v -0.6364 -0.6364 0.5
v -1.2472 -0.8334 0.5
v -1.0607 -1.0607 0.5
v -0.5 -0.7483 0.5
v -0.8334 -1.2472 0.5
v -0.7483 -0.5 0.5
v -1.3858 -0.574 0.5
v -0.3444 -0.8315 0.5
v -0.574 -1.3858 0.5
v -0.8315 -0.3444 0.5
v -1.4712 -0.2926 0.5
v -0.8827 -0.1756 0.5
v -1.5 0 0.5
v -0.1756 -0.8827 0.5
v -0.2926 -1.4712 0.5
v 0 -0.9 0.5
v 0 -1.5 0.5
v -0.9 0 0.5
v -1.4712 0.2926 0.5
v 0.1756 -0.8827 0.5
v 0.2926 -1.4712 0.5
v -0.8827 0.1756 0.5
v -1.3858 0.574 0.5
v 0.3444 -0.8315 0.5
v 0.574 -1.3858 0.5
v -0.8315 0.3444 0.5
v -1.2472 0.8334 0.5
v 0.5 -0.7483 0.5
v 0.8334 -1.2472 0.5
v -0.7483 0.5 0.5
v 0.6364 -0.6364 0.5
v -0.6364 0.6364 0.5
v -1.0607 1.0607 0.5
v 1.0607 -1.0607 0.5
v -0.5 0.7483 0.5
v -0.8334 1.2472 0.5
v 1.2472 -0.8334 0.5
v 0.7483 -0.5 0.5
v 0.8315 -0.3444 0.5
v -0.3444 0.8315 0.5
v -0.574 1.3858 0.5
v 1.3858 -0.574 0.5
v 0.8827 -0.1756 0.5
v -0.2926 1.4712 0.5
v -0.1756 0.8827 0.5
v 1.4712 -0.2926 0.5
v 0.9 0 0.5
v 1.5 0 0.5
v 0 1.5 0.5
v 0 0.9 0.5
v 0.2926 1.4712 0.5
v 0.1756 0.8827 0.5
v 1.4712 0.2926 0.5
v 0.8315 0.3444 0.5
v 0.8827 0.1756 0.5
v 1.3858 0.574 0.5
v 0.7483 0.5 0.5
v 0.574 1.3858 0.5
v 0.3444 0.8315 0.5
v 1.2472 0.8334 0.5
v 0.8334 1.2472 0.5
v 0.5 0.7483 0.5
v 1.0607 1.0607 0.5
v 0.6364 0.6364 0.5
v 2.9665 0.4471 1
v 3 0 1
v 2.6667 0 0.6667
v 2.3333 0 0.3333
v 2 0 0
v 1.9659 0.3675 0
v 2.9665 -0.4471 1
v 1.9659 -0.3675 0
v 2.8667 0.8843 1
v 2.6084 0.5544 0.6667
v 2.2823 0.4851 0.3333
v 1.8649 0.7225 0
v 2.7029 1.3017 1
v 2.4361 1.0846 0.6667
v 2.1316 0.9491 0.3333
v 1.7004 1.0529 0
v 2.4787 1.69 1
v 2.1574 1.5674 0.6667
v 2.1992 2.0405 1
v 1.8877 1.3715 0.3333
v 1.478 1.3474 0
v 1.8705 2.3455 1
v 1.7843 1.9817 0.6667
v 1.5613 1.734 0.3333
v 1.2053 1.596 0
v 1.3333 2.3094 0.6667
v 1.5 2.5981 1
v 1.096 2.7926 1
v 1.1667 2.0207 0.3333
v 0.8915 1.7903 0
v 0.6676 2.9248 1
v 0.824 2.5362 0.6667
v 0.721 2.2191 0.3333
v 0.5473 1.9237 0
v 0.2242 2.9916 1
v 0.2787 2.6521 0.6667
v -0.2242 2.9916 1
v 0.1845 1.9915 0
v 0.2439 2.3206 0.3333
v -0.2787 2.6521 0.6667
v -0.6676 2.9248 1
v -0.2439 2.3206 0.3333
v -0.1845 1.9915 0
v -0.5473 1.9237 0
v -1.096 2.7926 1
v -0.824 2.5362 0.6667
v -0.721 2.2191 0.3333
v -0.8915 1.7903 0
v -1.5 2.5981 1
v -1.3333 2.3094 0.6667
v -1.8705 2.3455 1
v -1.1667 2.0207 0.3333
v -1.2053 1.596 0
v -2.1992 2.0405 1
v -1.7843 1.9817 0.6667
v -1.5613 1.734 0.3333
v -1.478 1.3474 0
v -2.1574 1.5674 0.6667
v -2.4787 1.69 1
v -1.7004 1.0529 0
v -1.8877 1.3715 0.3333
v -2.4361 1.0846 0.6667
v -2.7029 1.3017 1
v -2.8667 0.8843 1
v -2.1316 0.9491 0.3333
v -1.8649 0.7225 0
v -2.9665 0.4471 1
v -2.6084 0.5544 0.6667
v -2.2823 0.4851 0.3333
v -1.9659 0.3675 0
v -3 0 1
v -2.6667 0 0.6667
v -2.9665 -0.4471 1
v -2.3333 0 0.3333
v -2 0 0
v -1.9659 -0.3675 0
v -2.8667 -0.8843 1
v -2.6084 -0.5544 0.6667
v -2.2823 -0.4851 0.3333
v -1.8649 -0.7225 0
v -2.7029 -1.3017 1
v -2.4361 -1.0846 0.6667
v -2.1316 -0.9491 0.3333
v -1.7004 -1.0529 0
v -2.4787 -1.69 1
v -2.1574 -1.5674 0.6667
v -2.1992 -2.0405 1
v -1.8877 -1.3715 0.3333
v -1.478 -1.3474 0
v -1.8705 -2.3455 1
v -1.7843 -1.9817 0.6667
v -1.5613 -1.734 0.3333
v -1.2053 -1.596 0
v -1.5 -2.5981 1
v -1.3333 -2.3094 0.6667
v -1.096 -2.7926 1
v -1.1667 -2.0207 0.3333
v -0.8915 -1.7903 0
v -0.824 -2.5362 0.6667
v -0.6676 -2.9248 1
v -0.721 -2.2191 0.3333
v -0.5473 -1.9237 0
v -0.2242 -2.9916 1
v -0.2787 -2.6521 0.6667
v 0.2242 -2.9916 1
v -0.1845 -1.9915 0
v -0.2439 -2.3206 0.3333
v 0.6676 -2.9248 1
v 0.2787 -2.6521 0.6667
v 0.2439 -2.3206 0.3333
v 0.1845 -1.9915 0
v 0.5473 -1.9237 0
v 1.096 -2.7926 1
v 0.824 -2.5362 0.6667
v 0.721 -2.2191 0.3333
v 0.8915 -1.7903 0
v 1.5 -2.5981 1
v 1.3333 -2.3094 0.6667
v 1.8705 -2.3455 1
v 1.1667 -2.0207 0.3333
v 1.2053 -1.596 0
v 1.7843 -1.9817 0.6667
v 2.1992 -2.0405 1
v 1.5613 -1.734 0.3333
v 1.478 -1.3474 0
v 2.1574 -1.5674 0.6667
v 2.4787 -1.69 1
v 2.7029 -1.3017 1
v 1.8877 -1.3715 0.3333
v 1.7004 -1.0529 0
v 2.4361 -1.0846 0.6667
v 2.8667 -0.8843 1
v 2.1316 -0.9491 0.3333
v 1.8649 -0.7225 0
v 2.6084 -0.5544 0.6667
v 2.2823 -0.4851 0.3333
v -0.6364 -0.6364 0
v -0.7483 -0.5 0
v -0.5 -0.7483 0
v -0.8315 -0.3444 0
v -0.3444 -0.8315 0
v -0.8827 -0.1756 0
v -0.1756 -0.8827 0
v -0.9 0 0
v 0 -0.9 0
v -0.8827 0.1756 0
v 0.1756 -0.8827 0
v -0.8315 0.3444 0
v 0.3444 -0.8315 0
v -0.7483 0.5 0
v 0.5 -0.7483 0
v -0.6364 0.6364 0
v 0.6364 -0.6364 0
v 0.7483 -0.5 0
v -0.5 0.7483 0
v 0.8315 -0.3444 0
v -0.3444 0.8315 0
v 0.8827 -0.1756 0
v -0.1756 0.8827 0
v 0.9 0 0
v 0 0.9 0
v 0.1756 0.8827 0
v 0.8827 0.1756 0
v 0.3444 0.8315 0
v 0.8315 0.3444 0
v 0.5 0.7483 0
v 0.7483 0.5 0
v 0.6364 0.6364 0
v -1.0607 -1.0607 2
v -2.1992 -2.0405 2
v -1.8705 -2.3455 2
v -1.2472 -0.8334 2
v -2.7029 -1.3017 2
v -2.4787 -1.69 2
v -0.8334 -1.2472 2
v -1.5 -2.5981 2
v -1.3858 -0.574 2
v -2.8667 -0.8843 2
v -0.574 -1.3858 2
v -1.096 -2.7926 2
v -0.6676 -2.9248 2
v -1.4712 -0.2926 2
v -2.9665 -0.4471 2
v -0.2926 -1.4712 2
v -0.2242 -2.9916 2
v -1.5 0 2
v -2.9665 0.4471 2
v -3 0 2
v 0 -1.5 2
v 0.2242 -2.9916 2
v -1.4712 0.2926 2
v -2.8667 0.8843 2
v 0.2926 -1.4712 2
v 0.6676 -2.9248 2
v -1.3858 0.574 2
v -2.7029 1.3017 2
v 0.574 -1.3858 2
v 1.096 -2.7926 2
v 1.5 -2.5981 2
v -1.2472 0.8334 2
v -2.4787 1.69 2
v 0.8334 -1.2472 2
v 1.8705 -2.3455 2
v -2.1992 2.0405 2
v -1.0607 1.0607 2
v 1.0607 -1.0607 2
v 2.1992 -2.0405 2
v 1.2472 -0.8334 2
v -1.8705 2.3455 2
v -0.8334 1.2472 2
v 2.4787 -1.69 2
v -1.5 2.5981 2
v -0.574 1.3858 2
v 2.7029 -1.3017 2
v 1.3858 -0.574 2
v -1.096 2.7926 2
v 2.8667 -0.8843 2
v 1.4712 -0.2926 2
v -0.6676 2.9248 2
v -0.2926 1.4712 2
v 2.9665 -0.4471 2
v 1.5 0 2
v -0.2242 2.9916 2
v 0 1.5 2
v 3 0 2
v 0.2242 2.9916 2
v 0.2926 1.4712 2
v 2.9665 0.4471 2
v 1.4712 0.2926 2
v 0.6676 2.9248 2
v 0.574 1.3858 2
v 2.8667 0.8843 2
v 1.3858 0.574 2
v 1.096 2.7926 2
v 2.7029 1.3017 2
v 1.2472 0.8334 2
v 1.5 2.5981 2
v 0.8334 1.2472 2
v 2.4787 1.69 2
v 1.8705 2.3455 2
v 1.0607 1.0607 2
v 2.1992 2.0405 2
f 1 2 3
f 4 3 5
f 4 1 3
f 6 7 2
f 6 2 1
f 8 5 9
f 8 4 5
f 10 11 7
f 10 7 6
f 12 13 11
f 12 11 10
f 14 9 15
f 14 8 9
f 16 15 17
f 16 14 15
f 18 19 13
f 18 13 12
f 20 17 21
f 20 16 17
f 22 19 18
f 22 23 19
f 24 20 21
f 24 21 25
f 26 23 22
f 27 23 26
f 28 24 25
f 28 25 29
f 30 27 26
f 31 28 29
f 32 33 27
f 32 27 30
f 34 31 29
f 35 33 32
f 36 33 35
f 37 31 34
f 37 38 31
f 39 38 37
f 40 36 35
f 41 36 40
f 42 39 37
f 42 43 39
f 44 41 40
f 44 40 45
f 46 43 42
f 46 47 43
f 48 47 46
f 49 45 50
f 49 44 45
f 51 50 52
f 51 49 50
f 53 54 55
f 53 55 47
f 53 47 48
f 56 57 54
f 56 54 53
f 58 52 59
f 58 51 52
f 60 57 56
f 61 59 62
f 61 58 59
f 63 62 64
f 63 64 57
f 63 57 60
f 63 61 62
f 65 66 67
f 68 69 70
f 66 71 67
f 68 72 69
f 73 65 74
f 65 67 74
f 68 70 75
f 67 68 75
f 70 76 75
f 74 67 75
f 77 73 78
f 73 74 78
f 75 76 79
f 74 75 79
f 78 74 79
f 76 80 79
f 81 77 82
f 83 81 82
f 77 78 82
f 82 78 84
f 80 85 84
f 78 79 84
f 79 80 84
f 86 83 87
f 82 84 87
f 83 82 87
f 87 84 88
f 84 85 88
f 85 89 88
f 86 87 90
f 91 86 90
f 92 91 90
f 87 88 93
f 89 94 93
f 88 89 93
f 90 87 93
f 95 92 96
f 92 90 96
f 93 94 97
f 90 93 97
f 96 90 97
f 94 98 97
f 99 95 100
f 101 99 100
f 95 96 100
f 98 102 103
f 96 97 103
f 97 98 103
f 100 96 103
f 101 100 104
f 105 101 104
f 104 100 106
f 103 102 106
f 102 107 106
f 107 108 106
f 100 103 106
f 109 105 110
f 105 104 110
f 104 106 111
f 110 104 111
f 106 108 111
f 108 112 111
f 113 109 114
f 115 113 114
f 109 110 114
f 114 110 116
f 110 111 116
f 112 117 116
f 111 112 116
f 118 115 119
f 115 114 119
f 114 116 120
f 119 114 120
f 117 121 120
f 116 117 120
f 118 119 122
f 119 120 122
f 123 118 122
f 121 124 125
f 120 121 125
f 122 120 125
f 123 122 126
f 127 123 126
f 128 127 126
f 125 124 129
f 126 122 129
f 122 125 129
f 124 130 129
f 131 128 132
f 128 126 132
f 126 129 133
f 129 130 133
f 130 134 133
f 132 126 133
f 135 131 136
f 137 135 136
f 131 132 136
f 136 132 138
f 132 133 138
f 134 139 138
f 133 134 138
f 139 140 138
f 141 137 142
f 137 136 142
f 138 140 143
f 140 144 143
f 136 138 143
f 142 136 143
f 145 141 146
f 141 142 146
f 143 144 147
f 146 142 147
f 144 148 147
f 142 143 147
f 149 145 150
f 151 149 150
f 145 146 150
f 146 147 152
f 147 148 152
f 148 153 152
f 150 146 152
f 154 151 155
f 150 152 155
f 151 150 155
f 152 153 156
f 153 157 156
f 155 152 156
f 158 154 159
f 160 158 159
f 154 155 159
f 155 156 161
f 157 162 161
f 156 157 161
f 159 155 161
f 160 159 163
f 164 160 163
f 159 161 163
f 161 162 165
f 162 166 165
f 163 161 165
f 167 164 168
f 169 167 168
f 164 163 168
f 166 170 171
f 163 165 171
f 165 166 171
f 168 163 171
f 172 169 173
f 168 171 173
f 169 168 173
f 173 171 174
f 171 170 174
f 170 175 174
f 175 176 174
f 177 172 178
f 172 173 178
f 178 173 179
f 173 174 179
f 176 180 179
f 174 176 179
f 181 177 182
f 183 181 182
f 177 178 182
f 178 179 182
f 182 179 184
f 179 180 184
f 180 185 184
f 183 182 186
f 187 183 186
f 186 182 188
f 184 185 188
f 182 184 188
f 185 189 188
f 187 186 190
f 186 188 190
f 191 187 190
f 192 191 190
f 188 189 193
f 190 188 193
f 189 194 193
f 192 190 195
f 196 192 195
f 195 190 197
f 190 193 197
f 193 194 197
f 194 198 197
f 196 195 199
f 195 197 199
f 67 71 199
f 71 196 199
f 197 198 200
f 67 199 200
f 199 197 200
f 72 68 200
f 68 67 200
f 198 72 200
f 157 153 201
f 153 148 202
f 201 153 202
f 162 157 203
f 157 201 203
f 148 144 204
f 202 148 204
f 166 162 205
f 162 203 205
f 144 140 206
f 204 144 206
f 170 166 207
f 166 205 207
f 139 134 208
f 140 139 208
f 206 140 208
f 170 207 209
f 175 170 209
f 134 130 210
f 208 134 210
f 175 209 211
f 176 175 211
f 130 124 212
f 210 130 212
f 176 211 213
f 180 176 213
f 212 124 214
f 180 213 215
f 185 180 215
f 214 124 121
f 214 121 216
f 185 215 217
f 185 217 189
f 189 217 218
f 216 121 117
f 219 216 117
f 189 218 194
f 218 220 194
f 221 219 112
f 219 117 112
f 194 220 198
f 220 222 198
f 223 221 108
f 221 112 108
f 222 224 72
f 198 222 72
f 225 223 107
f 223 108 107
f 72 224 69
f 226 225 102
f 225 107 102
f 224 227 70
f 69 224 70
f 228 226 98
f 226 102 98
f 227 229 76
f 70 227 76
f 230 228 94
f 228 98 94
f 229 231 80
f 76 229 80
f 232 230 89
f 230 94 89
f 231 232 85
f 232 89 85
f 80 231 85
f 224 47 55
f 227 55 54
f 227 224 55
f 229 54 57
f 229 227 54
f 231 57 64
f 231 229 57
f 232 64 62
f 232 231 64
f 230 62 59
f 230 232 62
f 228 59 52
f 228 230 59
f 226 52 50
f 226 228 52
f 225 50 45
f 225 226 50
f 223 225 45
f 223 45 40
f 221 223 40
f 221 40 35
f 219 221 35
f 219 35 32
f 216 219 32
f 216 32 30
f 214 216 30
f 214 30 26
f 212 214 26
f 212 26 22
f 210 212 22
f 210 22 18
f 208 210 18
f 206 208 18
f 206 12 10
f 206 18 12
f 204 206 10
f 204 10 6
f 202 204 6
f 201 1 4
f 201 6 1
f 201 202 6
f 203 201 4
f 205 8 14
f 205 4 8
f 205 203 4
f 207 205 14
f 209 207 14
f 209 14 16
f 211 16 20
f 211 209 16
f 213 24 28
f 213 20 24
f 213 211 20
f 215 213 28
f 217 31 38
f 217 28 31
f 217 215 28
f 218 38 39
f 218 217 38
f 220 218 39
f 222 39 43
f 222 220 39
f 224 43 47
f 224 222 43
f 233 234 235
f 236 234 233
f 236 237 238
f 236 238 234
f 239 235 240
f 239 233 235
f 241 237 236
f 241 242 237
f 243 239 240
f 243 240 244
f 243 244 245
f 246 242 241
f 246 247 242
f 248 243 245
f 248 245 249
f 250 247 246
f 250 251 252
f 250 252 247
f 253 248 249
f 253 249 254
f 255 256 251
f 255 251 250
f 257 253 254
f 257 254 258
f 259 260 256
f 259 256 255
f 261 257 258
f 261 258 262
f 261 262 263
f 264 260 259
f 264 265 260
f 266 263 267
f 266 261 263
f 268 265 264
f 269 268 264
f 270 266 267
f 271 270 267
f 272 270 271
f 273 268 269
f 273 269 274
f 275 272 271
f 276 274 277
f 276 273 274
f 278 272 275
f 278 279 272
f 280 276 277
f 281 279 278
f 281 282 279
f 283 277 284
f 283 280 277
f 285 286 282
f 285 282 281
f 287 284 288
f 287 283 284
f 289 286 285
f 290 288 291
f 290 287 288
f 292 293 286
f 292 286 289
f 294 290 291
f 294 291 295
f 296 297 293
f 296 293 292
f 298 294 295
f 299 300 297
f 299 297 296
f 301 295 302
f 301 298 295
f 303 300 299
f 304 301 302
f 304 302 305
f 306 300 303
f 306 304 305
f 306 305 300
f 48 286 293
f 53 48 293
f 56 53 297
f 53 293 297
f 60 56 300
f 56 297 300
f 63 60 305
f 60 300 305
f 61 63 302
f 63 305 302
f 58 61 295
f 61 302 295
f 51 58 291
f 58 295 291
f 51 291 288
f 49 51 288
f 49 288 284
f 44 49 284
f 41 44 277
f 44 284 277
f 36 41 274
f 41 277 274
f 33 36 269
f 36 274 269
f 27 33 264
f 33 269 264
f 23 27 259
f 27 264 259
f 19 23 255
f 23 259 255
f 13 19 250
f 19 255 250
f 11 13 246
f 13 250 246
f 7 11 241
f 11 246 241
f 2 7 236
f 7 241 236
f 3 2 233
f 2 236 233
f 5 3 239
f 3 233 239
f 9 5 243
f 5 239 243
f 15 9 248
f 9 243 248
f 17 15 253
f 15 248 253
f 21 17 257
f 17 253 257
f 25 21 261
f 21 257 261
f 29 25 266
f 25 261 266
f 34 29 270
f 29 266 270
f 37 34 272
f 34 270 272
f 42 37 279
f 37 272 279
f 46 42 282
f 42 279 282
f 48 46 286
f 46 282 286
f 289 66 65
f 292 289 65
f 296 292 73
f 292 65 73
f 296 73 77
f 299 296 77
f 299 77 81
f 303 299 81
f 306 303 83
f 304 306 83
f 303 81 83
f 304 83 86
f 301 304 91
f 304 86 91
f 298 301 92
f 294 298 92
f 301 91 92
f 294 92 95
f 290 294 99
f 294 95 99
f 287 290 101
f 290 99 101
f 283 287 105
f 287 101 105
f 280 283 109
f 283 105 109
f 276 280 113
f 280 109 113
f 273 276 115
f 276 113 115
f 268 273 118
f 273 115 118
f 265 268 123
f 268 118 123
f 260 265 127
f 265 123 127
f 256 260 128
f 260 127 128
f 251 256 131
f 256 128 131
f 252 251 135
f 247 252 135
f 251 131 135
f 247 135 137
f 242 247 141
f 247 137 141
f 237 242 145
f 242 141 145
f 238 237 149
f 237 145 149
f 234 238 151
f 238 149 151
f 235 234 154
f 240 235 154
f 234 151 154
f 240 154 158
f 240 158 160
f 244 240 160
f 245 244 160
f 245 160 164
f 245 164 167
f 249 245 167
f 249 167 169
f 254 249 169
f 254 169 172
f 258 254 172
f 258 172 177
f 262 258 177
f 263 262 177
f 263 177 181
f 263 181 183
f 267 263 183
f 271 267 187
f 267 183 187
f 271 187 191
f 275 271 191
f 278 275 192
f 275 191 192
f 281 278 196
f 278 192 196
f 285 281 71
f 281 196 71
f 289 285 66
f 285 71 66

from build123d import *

# Parameters (mm, degrees)
SKETCH1_R           = 3
SKETCH1_R_2         = 0.9
BOSS_EXTRUDE1_DEPTH = 2
CHAMFER1_SIZE       = 1
SKETCH2_R           = 1.5
CUT_EXTRUDE1_DEPTH  = 1.5


with BuildPart() as part:
    # Sketch1 → Boss-Extrude1 (new body)
    with BuildSketch(Plane.XY):
        Circle(SKETCH1_R)
        Circle(SKETCH1_R_2, mode=Mode.SUBTRACT)
    extrude(amount=BOSS_EXTRUDE1_DEPTH)

    # Chamfer1
    chamfer1_edges = [part.edges().sort_by_distance(p)[0] for p in [
        (-3, 0, 0),
    ]]
    chamfer(chamfer1_edges, length=CHAMFER1_SIZE)

    # Sketch2 → Cut-Extrude1 (cut)
    with BuildSketch(Plane.XY.offset(2)):
        Circle(SKETCH2_R)
    extrude(amount=-CUT_EXTRUDE1_DEPTH, mode=Mode.SUBTRACT)


solid = part.part
